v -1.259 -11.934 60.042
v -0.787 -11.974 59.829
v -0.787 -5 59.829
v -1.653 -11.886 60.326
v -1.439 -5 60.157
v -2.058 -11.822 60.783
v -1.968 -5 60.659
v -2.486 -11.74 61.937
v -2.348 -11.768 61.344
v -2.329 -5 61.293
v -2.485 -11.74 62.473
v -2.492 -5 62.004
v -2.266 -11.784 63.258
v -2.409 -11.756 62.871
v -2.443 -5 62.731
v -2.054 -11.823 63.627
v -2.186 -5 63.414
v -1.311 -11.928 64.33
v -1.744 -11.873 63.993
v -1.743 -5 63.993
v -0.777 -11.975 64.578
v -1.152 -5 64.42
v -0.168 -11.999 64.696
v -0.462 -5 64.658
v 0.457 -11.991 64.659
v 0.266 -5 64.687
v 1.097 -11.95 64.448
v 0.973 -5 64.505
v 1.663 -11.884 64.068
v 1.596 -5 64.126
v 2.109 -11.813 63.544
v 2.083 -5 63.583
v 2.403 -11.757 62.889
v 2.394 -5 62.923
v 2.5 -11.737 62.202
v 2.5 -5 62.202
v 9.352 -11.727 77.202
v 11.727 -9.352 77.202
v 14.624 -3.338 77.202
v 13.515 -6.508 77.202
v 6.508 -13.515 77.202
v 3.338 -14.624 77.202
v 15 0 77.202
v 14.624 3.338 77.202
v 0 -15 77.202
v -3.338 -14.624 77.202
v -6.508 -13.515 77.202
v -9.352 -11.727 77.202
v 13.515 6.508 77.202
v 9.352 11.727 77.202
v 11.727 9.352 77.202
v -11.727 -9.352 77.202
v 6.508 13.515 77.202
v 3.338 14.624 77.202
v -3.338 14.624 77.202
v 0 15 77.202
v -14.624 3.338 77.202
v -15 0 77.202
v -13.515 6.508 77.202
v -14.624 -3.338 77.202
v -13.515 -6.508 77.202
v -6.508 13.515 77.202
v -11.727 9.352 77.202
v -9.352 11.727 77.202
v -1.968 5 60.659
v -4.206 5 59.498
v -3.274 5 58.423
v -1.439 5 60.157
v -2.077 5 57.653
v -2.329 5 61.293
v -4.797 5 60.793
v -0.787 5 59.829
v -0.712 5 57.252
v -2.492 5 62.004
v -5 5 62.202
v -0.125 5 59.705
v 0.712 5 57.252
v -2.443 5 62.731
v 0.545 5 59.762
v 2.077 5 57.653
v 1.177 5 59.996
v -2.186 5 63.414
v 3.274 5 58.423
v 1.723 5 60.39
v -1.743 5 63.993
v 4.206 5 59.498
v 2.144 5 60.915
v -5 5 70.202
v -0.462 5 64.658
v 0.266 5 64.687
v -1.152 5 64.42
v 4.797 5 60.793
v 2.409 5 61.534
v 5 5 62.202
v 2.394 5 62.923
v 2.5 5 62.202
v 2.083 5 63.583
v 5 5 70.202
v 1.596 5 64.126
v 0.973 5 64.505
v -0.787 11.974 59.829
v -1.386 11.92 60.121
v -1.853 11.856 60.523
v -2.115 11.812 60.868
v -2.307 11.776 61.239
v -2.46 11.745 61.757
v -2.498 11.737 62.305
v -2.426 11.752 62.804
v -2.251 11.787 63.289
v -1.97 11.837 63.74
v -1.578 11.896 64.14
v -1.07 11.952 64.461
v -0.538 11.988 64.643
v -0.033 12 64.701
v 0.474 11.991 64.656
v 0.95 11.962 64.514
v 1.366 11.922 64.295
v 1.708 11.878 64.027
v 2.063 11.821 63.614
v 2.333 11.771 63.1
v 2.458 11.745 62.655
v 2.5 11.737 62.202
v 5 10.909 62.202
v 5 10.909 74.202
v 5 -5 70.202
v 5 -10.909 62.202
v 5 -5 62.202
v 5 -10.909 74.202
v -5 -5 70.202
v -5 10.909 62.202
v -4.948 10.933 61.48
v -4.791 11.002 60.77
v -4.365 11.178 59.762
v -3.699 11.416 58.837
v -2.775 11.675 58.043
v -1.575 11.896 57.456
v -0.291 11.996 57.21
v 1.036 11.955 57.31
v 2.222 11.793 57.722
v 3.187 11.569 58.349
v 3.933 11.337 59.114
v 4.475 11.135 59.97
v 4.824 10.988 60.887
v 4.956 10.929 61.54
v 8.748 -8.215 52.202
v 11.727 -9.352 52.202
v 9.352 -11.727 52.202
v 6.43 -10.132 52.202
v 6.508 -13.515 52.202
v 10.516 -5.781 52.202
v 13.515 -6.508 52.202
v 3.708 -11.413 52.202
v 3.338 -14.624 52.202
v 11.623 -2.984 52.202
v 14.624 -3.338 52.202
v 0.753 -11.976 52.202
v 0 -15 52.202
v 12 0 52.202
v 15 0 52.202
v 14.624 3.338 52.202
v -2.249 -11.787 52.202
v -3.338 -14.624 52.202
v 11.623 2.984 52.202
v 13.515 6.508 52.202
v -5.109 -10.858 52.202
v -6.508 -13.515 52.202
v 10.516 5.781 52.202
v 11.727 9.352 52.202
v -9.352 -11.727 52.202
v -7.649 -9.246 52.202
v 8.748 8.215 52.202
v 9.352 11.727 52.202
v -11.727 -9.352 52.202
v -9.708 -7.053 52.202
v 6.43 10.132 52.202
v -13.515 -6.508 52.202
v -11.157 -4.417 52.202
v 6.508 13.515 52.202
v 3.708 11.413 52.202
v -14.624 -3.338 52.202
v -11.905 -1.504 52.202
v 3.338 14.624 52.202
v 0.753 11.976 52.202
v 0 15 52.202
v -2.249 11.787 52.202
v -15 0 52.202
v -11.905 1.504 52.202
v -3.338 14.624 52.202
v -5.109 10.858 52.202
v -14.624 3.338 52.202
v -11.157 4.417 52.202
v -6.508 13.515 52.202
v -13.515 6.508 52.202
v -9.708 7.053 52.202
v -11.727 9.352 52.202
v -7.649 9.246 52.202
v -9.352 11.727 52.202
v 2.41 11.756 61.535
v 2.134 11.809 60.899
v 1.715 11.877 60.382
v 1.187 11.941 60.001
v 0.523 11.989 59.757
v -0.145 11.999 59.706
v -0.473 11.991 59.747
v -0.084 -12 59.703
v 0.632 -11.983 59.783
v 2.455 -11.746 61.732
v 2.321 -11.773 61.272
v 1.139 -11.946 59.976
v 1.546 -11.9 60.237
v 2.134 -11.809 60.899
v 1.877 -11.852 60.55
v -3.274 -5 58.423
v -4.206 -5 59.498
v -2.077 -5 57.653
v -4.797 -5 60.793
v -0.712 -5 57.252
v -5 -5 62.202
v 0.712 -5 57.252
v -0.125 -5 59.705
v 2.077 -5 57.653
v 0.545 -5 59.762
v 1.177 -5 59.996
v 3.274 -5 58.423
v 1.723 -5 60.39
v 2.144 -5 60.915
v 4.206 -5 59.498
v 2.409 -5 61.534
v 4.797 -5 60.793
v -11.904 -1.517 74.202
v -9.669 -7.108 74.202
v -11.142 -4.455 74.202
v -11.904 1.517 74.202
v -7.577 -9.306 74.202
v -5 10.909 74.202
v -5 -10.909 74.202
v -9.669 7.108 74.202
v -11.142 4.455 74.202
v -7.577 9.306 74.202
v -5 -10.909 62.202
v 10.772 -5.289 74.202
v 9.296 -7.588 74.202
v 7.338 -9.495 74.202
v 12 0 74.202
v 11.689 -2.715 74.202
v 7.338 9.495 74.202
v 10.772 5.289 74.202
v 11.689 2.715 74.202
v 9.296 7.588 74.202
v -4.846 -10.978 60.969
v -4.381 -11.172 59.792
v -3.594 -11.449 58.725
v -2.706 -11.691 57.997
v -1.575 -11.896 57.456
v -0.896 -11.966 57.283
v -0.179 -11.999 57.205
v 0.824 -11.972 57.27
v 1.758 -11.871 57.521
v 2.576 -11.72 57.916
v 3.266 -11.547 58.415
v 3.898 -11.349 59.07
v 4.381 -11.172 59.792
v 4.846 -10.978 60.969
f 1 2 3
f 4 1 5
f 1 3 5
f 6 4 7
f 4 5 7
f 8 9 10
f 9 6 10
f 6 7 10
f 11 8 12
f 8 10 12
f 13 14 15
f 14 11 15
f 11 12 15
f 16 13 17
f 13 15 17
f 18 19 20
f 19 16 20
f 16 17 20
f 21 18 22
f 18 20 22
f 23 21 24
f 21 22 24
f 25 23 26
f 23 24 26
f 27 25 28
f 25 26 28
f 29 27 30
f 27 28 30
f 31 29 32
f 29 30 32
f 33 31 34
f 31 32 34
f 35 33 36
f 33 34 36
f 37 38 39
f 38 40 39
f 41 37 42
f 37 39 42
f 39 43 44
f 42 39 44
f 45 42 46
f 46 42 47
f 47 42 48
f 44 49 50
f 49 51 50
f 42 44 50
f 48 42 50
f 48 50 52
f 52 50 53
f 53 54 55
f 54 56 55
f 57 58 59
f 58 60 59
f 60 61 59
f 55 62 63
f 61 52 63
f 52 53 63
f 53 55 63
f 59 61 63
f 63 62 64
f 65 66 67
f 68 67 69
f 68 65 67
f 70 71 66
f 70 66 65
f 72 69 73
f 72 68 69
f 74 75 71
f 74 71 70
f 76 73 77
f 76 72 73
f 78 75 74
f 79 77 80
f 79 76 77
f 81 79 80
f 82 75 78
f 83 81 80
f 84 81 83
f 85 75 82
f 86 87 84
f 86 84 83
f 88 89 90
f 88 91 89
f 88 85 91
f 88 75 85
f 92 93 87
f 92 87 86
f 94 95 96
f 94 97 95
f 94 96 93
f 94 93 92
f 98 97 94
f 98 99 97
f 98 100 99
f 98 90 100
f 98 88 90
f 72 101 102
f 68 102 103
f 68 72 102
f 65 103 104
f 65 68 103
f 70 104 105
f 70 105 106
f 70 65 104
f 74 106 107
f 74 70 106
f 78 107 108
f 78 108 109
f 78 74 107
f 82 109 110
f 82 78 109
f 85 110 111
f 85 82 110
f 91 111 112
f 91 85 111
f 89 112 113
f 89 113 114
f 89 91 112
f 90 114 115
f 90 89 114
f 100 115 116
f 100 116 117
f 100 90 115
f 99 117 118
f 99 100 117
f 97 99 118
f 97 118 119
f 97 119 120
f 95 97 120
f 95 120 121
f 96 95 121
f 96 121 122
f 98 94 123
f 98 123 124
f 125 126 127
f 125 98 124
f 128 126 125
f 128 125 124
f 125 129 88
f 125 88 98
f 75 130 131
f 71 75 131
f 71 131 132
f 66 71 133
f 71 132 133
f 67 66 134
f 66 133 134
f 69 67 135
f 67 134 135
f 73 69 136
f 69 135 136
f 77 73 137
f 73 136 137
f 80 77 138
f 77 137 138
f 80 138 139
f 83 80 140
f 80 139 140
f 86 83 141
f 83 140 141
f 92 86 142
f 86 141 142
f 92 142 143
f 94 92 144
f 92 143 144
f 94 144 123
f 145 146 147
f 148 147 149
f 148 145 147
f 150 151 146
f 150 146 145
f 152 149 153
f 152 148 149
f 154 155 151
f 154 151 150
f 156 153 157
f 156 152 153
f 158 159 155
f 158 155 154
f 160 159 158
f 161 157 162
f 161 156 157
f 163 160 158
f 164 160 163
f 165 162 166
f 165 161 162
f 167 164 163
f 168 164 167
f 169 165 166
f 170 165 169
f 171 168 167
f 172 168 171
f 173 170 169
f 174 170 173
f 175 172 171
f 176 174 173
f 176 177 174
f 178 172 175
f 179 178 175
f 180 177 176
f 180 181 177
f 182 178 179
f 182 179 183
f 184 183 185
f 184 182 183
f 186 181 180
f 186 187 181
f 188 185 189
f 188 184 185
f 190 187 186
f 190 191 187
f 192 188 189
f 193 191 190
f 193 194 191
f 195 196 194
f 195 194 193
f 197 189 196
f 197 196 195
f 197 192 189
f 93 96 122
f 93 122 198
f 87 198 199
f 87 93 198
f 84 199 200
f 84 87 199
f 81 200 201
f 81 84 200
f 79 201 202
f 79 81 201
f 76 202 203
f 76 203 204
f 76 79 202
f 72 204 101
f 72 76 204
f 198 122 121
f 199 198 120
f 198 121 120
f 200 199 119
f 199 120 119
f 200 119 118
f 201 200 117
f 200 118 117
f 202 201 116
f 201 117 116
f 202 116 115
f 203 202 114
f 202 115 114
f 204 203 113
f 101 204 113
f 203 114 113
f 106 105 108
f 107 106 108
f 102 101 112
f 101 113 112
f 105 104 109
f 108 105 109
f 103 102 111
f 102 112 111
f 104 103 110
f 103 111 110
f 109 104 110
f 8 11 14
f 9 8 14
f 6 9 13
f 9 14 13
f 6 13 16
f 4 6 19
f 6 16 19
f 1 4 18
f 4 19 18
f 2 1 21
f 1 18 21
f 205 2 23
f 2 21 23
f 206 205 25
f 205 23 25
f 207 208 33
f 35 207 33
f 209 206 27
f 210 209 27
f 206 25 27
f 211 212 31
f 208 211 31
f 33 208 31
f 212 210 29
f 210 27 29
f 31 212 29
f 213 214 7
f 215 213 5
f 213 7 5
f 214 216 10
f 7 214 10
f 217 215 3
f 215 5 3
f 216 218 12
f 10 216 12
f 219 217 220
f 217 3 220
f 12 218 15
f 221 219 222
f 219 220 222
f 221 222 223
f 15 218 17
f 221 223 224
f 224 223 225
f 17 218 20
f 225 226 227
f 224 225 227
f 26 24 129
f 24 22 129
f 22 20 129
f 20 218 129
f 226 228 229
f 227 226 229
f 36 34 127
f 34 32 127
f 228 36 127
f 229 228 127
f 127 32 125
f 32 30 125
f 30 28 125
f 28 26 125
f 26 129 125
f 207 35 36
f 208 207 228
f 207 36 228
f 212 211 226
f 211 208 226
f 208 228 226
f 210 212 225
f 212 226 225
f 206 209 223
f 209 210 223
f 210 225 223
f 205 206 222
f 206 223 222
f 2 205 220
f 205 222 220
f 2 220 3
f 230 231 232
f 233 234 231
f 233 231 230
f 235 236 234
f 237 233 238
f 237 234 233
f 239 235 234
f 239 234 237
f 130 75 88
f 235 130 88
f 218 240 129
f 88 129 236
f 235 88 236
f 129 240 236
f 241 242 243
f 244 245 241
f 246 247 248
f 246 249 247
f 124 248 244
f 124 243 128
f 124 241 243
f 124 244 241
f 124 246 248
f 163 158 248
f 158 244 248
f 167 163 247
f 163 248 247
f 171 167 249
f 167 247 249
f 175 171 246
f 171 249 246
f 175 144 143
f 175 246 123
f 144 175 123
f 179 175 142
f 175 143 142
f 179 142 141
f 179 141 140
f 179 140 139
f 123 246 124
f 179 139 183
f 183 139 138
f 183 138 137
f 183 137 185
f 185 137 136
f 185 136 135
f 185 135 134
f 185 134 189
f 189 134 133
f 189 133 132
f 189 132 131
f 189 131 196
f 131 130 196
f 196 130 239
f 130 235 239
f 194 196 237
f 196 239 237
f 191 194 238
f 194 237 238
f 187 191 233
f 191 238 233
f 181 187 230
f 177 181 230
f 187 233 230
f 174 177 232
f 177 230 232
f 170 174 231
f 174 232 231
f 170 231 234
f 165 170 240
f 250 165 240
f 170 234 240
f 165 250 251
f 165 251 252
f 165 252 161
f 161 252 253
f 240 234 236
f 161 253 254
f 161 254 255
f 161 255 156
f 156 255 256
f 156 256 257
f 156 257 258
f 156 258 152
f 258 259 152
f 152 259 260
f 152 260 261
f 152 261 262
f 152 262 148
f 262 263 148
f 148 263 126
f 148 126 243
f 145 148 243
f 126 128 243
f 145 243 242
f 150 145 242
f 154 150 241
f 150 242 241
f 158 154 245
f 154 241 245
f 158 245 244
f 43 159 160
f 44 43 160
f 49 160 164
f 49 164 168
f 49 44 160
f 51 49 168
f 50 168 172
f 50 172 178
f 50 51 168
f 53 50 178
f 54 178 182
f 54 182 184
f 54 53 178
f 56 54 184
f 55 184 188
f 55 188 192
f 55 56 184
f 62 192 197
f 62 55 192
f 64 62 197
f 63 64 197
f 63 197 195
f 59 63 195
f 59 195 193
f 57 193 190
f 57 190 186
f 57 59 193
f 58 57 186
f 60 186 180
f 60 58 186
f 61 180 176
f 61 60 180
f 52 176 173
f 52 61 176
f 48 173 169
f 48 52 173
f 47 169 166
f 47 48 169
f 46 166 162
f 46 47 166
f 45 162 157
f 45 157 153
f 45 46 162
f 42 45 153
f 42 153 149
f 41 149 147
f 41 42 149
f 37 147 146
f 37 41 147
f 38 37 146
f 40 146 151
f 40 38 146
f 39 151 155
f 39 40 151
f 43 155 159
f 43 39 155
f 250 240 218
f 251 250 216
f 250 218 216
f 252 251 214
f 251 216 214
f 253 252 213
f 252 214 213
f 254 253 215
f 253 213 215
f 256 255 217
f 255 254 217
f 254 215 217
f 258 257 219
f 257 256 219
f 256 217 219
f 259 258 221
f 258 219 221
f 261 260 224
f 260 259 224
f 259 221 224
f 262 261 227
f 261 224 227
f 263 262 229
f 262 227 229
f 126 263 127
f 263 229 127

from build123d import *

# Parameters (mm, degrees)
F1_W          = 15
F1_H          = 25
F3_T          = -3
F4_DEPTH      = 12.0000001006
F4_DEPTH_BACK = 12.0000001006
F5_R          = 2.5
F6_DEPTH      = 5
F7_W          = 10
F7_H          = 7
F8_DEPTH      = 12
F8_DEPTH_BACK = 12


with BuildPart() as f2:
    # F1 (on Front) → F2 (revolve)
    with BuildSketch(Plane.XZ):
        with Locations((7.5, 64.7015325446)):
            Rectangle(F1_W, F1_H)
    revolve(axis=Axis((0, 0, 62.2015325446), (0, 0, 1)))

    # F3
    f3_openings = [f2.faces().sort_by_distance(p)[0] for p in [
        (0, 0, 52.201533),
    ]]
    offset(amount=F3_T, openings=f3_openings)

    # F0 (on Front) → F4 (join, two sides)
    with BuildSketch(Plane.XZ) as f4_sk:
        with BuildLine():
            ThreePointArc((-5, 62.2015325446), (-4.0541927813, 59.2751831307), (-1.5745916432, 57.4559386769))
            ThreePointArc((-1.5745916432, 57.4559386769), (2.9263494138, 58.1473397632), (5, 62.2015325446))
            Line((5, 62.2015325446), (5, 70.2015325446))
            Line((5, 70.2015325446), (-5, 70.2015325446))
            Line((-5, 70.2015325446), (-5, 62.2015325446))
        make_face()
        with BuildLine():
            ThreePointArc((2.5, 62.2015325446), (1.4631747069, 60.1744361539), (-0.7872958216, 59.8287356107))
            ThreePointArc((-0.7872958216, 59.8287356107), (-1.4631747069, 64.2286289352), (2.5, 62.2015325446))
        make_face(mode=Mode.SUBTRACT)
    extrude(amount=-F4_DEPTH)
    extrude(f4_sk.sketch, amount=F4_DEPTH_BACK)

    # F5 (on Front) → F6 (cut, symmetric)
    with BuildSketch(Plane.XZ):
        with BuildLine():
            Line((5, 70.2015325446), (-5, 70.2015325446))
            Line((-5, 70.2015325446), (-5, 62.2015325446))
            ThreePointArc((-5, 62.2015325446), (0, 57.2015325446), (5, 62.2015325446))
            Line((5, 62.2015325446), (5, 70.2015325446))
        make_face()
        with Locations((0, 62.2015325446)):
            Circle(F5_R, mode=Mode.SUBTRACT)
    extrude(amount=F6_DEPTH, both=True, mode=Mode.SUBTRACT)

    # F7 (on Front) → F8 (join, two sides)
    with BuildSketch(Plane.XZ) as f8_sk:
        with Locations((0, 73.7015325446)):
            Rectangle(F7_W, F7_H)
    extrude(amount=F8_DEPTH)
    extrude(f8_sk.sketch, amount=-F8_DEPTH_BACK)


solid = f2.part
